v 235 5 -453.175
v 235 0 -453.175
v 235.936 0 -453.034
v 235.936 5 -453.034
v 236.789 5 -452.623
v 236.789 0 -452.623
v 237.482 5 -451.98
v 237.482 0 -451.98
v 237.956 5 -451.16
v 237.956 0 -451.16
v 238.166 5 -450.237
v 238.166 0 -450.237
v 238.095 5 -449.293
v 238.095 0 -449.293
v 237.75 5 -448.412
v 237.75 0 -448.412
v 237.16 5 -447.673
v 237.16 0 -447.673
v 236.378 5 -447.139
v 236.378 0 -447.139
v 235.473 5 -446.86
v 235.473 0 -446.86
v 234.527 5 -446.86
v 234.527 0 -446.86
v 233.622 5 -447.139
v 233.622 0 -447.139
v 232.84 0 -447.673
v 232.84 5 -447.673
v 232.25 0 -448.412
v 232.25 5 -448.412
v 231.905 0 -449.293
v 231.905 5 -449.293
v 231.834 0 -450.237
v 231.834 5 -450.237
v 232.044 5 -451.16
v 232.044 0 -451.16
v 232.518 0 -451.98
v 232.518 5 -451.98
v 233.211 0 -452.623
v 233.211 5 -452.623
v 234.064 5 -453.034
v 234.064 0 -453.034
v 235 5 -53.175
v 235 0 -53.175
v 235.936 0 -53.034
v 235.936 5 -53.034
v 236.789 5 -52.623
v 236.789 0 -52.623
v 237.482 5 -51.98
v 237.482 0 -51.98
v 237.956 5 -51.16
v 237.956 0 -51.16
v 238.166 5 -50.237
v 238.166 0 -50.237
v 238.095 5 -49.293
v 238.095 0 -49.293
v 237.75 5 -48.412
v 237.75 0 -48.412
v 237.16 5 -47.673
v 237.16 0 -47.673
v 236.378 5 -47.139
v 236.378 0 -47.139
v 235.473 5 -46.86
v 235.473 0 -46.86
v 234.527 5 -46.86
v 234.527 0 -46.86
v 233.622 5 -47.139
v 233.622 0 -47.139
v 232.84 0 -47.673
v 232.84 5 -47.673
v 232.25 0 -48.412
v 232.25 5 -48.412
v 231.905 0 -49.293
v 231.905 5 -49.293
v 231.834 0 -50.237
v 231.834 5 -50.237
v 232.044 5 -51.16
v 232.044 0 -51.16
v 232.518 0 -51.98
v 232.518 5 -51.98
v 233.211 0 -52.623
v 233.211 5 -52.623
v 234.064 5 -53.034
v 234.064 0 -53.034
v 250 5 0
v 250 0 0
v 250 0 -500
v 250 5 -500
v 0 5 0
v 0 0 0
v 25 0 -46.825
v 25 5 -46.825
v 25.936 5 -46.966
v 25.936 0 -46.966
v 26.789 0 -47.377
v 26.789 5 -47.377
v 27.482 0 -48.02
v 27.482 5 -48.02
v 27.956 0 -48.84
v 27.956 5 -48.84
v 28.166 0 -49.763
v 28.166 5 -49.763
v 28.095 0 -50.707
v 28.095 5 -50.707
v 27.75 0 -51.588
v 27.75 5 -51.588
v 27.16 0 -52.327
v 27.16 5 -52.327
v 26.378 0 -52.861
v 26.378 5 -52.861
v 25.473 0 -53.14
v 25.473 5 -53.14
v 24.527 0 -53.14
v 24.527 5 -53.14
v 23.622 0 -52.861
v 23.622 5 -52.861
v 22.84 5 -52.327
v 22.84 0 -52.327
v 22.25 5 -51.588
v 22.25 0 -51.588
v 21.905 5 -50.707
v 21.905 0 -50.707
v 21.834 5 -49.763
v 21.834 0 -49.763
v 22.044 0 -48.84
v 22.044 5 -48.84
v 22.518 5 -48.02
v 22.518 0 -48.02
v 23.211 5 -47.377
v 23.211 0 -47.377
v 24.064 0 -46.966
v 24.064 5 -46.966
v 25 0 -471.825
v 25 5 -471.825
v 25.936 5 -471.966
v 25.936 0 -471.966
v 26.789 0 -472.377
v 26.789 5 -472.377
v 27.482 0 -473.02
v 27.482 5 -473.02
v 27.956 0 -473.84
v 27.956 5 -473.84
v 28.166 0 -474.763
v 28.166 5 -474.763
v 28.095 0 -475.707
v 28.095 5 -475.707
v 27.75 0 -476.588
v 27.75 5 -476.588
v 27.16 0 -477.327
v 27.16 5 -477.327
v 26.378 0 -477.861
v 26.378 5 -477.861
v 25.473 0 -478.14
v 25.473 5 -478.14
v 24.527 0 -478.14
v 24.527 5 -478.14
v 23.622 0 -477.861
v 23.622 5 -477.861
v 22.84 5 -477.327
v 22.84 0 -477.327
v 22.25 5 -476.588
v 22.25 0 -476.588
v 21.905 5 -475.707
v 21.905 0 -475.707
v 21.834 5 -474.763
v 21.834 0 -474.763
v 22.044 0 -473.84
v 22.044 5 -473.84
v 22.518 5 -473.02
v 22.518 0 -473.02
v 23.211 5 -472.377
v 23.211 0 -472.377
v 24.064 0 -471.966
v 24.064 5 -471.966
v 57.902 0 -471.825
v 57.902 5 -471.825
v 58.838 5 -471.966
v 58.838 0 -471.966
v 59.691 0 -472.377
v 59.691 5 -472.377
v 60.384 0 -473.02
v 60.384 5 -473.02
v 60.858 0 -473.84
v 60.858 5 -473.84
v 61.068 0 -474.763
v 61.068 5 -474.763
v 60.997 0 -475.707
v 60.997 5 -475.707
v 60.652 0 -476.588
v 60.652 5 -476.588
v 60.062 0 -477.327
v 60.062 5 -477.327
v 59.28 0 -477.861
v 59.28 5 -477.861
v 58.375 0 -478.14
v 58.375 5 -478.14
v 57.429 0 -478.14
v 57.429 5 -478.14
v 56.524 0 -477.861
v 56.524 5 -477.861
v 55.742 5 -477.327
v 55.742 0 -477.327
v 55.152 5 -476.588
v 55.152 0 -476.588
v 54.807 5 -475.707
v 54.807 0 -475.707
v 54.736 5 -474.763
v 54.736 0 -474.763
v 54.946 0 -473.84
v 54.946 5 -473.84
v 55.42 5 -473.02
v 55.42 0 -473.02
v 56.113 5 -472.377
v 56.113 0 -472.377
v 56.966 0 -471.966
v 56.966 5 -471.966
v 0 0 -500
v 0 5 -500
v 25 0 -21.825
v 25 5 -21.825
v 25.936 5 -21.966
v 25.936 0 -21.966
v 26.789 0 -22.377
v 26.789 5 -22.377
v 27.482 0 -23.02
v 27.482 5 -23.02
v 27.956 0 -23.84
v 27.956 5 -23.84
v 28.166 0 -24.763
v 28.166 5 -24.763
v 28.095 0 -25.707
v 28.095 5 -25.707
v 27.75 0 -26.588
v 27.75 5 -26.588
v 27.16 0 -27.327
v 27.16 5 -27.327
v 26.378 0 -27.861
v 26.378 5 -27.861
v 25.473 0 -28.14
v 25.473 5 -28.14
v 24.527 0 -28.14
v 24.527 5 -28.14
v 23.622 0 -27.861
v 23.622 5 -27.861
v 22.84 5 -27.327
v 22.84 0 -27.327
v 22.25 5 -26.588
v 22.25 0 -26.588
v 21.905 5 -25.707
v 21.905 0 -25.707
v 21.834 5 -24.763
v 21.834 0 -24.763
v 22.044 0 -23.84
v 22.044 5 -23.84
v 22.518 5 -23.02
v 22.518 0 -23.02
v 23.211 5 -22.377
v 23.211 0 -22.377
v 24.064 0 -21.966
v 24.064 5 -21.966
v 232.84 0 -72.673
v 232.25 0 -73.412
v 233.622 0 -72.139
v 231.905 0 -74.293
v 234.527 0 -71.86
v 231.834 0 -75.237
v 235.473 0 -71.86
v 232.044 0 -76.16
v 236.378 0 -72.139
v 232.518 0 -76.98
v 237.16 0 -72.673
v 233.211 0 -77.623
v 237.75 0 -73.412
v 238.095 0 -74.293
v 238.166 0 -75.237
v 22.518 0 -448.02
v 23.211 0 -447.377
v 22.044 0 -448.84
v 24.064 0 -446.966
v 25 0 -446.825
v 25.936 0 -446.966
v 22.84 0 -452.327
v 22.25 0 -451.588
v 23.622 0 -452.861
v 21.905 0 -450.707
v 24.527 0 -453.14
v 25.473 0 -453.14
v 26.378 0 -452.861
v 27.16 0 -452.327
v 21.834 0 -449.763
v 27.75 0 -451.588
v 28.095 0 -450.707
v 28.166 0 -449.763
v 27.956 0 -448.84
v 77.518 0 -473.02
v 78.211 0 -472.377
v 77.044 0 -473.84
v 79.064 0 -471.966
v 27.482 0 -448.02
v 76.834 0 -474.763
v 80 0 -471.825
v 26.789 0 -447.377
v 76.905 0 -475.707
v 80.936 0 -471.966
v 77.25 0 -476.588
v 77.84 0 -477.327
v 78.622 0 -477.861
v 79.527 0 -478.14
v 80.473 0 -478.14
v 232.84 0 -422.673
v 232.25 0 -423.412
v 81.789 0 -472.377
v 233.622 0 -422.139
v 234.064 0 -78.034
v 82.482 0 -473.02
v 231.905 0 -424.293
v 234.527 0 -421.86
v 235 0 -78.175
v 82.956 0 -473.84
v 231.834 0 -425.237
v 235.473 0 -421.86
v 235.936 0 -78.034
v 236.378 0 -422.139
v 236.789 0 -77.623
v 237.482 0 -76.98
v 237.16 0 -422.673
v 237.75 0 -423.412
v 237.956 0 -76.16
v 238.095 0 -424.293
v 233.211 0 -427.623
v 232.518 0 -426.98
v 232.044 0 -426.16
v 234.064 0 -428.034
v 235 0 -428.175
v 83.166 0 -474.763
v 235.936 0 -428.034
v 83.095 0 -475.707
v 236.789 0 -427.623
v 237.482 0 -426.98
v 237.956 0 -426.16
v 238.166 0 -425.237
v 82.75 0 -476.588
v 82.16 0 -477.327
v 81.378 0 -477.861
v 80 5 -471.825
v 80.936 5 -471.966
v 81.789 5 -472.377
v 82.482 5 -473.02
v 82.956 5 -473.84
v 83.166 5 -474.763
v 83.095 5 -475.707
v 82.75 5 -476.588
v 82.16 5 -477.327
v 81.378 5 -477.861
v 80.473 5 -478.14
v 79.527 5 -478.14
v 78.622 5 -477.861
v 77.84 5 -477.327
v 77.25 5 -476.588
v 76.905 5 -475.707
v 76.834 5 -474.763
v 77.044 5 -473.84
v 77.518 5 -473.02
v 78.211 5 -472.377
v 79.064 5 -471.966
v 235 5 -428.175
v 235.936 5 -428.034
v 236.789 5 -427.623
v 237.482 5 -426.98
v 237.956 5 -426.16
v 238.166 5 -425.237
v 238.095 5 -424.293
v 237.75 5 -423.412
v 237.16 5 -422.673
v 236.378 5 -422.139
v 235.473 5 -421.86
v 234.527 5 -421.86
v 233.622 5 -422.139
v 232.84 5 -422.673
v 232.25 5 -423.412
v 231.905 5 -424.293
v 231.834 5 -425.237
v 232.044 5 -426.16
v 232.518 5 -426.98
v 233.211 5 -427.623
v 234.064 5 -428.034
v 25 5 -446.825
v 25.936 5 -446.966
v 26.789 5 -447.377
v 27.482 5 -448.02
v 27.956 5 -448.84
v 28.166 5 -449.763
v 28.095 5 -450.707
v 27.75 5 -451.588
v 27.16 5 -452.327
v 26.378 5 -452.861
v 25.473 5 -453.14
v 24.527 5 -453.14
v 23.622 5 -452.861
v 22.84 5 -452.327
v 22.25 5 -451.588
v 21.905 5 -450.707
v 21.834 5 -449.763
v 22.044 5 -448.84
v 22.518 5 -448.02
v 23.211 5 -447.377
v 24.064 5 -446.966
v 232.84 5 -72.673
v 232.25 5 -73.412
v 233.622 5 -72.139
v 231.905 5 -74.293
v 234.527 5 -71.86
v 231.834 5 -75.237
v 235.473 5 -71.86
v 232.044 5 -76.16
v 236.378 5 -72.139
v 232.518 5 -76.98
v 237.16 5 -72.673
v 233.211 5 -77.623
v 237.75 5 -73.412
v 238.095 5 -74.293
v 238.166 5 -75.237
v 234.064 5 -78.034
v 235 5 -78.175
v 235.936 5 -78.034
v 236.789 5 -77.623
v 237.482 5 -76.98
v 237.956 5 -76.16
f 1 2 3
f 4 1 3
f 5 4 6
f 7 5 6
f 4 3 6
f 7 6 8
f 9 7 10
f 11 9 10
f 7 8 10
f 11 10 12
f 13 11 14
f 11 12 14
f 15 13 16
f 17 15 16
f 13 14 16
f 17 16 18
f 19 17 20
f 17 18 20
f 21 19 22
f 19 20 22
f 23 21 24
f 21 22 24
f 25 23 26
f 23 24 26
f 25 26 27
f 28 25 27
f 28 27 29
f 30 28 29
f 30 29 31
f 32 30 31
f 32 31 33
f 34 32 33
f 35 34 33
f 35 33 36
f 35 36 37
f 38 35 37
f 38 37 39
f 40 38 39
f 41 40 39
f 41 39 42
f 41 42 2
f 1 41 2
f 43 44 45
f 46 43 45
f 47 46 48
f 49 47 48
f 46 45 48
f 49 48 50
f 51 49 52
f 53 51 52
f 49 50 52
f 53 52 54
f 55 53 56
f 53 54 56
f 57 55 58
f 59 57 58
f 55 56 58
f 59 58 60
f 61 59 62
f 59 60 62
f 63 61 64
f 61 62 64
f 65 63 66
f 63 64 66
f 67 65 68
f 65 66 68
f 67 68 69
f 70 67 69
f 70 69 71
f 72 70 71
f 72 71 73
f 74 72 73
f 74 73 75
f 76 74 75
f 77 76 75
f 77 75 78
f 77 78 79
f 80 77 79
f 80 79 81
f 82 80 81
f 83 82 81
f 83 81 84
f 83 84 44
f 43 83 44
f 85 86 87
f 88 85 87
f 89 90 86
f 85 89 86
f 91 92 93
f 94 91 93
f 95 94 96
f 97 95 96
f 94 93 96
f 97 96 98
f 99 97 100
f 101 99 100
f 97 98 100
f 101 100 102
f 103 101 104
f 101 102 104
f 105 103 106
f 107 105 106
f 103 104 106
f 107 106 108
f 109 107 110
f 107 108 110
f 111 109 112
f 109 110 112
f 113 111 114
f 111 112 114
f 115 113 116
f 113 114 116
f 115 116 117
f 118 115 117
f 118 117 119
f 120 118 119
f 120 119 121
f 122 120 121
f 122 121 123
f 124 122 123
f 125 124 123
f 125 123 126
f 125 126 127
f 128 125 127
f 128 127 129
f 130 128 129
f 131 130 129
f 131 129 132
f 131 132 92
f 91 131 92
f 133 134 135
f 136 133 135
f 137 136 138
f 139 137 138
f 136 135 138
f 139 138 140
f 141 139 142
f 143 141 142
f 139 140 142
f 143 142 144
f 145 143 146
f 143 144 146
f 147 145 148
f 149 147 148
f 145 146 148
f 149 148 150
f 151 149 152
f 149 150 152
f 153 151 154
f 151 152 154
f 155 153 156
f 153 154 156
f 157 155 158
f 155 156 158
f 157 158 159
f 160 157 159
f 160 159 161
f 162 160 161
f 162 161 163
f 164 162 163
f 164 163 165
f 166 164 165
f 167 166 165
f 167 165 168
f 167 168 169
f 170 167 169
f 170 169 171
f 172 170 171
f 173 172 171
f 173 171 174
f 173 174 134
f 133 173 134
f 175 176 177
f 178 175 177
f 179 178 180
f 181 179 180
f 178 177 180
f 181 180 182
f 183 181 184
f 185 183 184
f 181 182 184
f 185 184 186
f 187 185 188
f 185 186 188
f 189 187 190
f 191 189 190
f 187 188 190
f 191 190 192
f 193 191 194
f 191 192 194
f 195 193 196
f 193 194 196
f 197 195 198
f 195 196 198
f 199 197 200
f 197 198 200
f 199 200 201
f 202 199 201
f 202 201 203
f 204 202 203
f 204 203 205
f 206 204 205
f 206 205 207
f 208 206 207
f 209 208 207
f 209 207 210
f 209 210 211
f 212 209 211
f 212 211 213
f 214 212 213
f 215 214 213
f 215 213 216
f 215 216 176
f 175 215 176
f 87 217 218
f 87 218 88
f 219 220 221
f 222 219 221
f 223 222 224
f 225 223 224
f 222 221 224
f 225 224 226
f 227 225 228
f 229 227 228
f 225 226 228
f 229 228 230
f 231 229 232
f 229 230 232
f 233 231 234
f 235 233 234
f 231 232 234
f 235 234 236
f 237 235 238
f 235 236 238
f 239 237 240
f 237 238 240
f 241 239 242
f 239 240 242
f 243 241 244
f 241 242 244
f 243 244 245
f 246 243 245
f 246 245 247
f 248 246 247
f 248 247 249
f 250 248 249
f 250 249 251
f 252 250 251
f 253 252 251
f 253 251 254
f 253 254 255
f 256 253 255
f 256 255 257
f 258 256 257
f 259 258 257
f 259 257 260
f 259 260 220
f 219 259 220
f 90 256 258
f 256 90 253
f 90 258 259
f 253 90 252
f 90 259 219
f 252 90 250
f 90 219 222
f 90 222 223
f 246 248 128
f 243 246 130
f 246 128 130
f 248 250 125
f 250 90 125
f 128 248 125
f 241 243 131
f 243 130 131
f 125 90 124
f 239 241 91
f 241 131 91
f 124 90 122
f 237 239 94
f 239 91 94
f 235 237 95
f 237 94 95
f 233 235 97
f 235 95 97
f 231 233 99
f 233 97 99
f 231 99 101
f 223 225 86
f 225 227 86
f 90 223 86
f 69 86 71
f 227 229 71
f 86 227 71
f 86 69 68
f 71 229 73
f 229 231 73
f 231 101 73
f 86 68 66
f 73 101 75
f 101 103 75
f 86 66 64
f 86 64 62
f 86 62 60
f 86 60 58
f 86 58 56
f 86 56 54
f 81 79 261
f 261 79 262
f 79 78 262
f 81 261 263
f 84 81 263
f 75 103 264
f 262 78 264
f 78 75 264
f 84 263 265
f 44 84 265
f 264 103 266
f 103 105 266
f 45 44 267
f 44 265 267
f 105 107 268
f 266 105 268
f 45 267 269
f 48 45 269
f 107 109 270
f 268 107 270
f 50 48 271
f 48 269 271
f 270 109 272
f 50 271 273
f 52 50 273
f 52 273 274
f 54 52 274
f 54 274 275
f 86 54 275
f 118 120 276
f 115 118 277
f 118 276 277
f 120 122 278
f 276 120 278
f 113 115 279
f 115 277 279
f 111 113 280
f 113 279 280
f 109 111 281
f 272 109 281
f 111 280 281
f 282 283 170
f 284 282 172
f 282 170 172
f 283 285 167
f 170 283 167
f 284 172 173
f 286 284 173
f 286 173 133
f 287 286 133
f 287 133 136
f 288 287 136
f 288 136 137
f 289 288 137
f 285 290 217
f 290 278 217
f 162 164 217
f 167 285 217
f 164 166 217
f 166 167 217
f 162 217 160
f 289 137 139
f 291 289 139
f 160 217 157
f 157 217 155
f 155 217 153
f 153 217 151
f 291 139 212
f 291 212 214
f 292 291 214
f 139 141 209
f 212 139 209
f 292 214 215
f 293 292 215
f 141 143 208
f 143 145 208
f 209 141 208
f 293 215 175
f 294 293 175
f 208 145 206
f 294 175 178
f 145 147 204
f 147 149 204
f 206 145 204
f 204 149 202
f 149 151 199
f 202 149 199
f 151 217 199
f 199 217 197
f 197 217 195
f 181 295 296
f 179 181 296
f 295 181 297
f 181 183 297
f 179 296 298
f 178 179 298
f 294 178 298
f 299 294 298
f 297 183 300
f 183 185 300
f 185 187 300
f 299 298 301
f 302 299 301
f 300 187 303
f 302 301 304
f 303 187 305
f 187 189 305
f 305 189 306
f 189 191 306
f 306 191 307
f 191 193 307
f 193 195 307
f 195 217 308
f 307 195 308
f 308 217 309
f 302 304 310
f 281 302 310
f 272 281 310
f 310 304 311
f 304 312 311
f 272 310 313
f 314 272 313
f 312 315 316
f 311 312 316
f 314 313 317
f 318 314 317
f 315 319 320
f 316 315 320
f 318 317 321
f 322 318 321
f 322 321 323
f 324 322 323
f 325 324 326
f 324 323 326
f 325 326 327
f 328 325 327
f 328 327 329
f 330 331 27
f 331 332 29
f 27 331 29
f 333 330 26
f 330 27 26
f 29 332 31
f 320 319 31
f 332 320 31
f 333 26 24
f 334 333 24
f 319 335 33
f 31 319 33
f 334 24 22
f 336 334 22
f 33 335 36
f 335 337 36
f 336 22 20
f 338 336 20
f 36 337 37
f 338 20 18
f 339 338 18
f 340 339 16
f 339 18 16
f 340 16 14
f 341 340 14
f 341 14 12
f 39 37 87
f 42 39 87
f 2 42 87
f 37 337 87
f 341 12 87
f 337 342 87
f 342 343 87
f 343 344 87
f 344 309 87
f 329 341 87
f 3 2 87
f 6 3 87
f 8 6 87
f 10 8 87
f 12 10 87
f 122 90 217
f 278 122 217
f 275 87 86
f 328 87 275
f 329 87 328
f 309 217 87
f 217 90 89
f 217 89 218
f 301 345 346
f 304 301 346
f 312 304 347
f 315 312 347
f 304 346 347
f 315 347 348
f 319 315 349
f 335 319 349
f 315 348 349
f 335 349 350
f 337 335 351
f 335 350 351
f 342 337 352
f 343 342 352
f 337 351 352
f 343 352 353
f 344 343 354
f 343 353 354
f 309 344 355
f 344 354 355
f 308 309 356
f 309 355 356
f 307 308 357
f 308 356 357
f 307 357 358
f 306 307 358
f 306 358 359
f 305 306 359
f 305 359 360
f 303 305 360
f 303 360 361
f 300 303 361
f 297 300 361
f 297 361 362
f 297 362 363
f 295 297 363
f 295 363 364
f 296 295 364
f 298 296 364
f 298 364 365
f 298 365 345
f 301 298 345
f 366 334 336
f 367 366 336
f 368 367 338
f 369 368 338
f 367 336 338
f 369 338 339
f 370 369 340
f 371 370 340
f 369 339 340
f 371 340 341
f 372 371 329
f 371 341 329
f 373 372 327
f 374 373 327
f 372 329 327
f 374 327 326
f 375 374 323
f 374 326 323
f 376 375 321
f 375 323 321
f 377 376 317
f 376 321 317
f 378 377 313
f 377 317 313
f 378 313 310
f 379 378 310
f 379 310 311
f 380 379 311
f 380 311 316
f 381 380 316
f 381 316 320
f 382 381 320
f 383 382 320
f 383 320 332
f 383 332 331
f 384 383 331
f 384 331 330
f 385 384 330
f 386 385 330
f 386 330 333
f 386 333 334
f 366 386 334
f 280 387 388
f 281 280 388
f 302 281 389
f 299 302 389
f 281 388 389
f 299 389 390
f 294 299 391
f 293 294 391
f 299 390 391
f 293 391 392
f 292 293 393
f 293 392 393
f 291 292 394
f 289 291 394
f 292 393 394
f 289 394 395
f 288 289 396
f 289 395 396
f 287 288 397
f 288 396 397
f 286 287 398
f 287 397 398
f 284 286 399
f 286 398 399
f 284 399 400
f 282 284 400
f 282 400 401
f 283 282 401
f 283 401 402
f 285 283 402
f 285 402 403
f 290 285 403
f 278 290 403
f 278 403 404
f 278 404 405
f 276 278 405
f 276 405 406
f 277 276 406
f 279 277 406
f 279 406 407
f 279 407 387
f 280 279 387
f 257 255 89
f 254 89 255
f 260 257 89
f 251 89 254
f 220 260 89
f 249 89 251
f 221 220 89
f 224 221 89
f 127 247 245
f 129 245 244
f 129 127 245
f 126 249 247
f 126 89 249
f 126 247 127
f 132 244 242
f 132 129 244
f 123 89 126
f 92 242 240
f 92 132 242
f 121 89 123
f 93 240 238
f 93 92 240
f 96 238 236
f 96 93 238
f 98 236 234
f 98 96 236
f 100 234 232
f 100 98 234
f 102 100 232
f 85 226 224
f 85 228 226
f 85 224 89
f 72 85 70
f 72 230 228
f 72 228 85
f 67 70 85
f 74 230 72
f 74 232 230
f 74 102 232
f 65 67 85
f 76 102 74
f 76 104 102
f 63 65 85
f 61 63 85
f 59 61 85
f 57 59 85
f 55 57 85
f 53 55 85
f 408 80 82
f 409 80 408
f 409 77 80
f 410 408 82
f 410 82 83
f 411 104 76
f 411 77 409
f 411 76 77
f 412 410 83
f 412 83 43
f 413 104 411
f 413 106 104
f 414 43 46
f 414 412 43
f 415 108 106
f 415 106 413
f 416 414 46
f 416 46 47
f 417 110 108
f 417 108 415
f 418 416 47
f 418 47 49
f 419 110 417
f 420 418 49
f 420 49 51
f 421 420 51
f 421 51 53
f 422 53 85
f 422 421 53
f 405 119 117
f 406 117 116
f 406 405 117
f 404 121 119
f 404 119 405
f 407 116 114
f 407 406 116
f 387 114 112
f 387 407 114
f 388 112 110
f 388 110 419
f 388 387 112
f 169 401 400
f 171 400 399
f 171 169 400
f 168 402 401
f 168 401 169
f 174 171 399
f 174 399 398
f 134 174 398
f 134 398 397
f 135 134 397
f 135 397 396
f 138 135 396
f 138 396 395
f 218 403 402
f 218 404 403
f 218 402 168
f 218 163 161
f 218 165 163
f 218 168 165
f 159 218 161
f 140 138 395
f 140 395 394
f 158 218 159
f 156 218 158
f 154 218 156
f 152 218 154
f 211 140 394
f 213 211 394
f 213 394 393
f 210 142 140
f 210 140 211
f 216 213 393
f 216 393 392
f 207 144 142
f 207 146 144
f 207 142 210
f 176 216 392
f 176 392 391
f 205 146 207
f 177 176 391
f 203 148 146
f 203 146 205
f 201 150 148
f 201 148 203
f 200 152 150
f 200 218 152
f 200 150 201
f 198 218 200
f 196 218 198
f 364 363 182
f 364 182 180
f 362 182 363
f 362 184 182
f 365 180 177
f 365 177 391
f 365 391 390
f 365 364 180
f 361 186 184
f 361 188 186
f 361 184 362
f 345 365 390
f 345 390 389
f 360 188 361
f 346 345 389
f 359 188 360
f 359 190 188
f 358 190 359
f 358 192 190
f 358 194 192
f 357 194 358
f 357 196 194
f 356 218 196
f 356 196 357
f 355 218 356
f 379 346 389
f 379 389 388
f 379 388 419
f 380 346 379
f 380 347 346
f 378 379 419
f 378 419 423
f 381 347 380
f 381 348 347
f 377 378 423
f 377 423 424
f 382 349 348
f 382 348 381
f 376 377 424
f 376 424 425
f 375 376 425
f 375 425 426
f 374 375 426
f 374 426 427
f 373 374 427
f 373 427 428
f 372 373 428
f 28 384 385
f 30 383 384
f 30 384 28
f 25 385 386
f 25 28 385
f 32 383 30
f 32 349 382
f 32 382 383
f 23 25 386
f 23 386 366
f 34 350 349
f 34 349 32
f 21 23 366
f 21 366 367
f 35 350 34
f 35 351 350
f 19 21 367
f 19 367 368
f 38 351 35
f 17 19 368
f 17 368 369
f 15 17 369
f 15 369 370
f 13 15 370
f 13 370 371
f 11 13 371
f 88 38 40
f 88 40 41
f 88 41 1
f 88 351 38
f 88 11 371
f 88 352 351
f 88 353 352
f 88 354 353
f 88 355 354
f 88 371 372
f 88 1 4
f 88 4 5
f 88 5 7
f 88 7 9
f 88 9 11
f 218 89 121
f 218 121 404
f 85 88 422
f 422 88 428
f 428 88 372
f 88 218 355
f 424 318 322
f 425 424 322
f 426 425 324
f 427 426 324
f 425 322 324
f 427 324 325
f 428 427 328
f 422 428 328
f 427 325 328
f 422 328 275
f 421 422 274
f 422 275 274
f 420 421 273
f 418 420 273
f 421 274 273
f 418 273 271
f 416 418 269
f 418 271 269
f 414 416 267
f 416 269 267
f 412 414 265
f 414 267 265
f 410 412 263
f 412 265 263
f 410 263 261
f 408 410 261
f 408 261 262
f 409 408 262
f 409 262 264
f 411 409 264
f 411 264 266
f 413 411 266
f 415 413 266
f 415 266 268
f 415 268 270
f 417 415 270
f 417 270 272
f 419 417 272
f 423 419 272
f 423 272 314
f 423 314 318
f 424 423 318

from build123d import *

# Parameters (mm, degrees)
SKETCH1_W           = 250
SKETCH1_H           = 500
BOSS_EXTRUDE1_DEPTH = 5
SKETCH2_R           = 3.175
CUT_EXTRUDE1_DEPTH  = 10
SKETCH4_R           = 3.175
CUT_EXTRUDE3_DEPTH  = 10
SKETCH5_R           = 3.175
CUT_EXTRUDE4_DEPTH  = 10


with BuildPart() as part:
    # Sketch1 → Boss-Extrude1 (new body)
    with BuildSketch(Plane(origin=(0, 0, 0), x_dir=(1, 0, 0), z_dir=(0, 1, 0))):
        with Locations((125, 250)):
            Rectangle(SKETCH1_W, SKETCH1_H)
    extrude(amount=BOSS_EXTRUDE1_DEPTH)

    # Sketch2 → Cut-Extrude1 (cut)
    with BuildSketch(Plane(origin=(0, 5, 0), x_dir=(1, 0, 0), z_dir=(0, 1, 0))):
        with Locations(Location((25, 25, 0), (0, 0, 270))):
            Circle(SKETCH2_R)
        with Locations(Location((25, 50, 0), (0, 0, 270))):
            Circle(SKETCH2_R)
        with Locations(Location((25, 475, 0), (0, 0, 270))):
            Circle(SKETCH2_R)
        with Locations(Location((25, 450, 0), (0, 0, 270))):
            Circle(SKETCH2_R)
    extrude(amount=-CUT_EXTRUDE1_DEPTH, mode=Mode.SUBTRACT)

    # Sketch4 → Cut-Extrude3 (cut)
    with BuildSketch(Plane.XZ):
        with Locations(Location((235, -425, 0), (0, 0, 270))):
            Circle(SKETCH4_R)
        with Locations(Location((235, -50, 0), (0, 0, 270))):
            Circle(SKETCH4_R)
        with Locations(Location((235, -75, 0), (0, 0, 270))):
            Circle(SKETCH4_R)
        with Locations(Location((235, -450, 0), (0, 0, 270))):
            Circle(SKETCH4_R)
    extrude(amount=-CUT_EXTRUDE3_DEPTH, mode=Mode.SUBTRACT)

    # Sketch5 → Cut-Extrude4 (cut)
    with BuildSketch(Plane(origin=(0, 5, 0), x_dir=(1, 0, 0), z_dir=(0, 1, 0))):
        with Locations(Location((80, 475, 0), (0, 0, 270))):
            Circle(SKETCH5_R)
        with Locations(Location((57.902, 475, 0), (0, 0, 270))):
            Circle(SKETCH5_R)
    extrude(amount=-CUT_EXTRUDE4_DEPTH, mode=Mode.SUBTRACT)


solid = part.part
